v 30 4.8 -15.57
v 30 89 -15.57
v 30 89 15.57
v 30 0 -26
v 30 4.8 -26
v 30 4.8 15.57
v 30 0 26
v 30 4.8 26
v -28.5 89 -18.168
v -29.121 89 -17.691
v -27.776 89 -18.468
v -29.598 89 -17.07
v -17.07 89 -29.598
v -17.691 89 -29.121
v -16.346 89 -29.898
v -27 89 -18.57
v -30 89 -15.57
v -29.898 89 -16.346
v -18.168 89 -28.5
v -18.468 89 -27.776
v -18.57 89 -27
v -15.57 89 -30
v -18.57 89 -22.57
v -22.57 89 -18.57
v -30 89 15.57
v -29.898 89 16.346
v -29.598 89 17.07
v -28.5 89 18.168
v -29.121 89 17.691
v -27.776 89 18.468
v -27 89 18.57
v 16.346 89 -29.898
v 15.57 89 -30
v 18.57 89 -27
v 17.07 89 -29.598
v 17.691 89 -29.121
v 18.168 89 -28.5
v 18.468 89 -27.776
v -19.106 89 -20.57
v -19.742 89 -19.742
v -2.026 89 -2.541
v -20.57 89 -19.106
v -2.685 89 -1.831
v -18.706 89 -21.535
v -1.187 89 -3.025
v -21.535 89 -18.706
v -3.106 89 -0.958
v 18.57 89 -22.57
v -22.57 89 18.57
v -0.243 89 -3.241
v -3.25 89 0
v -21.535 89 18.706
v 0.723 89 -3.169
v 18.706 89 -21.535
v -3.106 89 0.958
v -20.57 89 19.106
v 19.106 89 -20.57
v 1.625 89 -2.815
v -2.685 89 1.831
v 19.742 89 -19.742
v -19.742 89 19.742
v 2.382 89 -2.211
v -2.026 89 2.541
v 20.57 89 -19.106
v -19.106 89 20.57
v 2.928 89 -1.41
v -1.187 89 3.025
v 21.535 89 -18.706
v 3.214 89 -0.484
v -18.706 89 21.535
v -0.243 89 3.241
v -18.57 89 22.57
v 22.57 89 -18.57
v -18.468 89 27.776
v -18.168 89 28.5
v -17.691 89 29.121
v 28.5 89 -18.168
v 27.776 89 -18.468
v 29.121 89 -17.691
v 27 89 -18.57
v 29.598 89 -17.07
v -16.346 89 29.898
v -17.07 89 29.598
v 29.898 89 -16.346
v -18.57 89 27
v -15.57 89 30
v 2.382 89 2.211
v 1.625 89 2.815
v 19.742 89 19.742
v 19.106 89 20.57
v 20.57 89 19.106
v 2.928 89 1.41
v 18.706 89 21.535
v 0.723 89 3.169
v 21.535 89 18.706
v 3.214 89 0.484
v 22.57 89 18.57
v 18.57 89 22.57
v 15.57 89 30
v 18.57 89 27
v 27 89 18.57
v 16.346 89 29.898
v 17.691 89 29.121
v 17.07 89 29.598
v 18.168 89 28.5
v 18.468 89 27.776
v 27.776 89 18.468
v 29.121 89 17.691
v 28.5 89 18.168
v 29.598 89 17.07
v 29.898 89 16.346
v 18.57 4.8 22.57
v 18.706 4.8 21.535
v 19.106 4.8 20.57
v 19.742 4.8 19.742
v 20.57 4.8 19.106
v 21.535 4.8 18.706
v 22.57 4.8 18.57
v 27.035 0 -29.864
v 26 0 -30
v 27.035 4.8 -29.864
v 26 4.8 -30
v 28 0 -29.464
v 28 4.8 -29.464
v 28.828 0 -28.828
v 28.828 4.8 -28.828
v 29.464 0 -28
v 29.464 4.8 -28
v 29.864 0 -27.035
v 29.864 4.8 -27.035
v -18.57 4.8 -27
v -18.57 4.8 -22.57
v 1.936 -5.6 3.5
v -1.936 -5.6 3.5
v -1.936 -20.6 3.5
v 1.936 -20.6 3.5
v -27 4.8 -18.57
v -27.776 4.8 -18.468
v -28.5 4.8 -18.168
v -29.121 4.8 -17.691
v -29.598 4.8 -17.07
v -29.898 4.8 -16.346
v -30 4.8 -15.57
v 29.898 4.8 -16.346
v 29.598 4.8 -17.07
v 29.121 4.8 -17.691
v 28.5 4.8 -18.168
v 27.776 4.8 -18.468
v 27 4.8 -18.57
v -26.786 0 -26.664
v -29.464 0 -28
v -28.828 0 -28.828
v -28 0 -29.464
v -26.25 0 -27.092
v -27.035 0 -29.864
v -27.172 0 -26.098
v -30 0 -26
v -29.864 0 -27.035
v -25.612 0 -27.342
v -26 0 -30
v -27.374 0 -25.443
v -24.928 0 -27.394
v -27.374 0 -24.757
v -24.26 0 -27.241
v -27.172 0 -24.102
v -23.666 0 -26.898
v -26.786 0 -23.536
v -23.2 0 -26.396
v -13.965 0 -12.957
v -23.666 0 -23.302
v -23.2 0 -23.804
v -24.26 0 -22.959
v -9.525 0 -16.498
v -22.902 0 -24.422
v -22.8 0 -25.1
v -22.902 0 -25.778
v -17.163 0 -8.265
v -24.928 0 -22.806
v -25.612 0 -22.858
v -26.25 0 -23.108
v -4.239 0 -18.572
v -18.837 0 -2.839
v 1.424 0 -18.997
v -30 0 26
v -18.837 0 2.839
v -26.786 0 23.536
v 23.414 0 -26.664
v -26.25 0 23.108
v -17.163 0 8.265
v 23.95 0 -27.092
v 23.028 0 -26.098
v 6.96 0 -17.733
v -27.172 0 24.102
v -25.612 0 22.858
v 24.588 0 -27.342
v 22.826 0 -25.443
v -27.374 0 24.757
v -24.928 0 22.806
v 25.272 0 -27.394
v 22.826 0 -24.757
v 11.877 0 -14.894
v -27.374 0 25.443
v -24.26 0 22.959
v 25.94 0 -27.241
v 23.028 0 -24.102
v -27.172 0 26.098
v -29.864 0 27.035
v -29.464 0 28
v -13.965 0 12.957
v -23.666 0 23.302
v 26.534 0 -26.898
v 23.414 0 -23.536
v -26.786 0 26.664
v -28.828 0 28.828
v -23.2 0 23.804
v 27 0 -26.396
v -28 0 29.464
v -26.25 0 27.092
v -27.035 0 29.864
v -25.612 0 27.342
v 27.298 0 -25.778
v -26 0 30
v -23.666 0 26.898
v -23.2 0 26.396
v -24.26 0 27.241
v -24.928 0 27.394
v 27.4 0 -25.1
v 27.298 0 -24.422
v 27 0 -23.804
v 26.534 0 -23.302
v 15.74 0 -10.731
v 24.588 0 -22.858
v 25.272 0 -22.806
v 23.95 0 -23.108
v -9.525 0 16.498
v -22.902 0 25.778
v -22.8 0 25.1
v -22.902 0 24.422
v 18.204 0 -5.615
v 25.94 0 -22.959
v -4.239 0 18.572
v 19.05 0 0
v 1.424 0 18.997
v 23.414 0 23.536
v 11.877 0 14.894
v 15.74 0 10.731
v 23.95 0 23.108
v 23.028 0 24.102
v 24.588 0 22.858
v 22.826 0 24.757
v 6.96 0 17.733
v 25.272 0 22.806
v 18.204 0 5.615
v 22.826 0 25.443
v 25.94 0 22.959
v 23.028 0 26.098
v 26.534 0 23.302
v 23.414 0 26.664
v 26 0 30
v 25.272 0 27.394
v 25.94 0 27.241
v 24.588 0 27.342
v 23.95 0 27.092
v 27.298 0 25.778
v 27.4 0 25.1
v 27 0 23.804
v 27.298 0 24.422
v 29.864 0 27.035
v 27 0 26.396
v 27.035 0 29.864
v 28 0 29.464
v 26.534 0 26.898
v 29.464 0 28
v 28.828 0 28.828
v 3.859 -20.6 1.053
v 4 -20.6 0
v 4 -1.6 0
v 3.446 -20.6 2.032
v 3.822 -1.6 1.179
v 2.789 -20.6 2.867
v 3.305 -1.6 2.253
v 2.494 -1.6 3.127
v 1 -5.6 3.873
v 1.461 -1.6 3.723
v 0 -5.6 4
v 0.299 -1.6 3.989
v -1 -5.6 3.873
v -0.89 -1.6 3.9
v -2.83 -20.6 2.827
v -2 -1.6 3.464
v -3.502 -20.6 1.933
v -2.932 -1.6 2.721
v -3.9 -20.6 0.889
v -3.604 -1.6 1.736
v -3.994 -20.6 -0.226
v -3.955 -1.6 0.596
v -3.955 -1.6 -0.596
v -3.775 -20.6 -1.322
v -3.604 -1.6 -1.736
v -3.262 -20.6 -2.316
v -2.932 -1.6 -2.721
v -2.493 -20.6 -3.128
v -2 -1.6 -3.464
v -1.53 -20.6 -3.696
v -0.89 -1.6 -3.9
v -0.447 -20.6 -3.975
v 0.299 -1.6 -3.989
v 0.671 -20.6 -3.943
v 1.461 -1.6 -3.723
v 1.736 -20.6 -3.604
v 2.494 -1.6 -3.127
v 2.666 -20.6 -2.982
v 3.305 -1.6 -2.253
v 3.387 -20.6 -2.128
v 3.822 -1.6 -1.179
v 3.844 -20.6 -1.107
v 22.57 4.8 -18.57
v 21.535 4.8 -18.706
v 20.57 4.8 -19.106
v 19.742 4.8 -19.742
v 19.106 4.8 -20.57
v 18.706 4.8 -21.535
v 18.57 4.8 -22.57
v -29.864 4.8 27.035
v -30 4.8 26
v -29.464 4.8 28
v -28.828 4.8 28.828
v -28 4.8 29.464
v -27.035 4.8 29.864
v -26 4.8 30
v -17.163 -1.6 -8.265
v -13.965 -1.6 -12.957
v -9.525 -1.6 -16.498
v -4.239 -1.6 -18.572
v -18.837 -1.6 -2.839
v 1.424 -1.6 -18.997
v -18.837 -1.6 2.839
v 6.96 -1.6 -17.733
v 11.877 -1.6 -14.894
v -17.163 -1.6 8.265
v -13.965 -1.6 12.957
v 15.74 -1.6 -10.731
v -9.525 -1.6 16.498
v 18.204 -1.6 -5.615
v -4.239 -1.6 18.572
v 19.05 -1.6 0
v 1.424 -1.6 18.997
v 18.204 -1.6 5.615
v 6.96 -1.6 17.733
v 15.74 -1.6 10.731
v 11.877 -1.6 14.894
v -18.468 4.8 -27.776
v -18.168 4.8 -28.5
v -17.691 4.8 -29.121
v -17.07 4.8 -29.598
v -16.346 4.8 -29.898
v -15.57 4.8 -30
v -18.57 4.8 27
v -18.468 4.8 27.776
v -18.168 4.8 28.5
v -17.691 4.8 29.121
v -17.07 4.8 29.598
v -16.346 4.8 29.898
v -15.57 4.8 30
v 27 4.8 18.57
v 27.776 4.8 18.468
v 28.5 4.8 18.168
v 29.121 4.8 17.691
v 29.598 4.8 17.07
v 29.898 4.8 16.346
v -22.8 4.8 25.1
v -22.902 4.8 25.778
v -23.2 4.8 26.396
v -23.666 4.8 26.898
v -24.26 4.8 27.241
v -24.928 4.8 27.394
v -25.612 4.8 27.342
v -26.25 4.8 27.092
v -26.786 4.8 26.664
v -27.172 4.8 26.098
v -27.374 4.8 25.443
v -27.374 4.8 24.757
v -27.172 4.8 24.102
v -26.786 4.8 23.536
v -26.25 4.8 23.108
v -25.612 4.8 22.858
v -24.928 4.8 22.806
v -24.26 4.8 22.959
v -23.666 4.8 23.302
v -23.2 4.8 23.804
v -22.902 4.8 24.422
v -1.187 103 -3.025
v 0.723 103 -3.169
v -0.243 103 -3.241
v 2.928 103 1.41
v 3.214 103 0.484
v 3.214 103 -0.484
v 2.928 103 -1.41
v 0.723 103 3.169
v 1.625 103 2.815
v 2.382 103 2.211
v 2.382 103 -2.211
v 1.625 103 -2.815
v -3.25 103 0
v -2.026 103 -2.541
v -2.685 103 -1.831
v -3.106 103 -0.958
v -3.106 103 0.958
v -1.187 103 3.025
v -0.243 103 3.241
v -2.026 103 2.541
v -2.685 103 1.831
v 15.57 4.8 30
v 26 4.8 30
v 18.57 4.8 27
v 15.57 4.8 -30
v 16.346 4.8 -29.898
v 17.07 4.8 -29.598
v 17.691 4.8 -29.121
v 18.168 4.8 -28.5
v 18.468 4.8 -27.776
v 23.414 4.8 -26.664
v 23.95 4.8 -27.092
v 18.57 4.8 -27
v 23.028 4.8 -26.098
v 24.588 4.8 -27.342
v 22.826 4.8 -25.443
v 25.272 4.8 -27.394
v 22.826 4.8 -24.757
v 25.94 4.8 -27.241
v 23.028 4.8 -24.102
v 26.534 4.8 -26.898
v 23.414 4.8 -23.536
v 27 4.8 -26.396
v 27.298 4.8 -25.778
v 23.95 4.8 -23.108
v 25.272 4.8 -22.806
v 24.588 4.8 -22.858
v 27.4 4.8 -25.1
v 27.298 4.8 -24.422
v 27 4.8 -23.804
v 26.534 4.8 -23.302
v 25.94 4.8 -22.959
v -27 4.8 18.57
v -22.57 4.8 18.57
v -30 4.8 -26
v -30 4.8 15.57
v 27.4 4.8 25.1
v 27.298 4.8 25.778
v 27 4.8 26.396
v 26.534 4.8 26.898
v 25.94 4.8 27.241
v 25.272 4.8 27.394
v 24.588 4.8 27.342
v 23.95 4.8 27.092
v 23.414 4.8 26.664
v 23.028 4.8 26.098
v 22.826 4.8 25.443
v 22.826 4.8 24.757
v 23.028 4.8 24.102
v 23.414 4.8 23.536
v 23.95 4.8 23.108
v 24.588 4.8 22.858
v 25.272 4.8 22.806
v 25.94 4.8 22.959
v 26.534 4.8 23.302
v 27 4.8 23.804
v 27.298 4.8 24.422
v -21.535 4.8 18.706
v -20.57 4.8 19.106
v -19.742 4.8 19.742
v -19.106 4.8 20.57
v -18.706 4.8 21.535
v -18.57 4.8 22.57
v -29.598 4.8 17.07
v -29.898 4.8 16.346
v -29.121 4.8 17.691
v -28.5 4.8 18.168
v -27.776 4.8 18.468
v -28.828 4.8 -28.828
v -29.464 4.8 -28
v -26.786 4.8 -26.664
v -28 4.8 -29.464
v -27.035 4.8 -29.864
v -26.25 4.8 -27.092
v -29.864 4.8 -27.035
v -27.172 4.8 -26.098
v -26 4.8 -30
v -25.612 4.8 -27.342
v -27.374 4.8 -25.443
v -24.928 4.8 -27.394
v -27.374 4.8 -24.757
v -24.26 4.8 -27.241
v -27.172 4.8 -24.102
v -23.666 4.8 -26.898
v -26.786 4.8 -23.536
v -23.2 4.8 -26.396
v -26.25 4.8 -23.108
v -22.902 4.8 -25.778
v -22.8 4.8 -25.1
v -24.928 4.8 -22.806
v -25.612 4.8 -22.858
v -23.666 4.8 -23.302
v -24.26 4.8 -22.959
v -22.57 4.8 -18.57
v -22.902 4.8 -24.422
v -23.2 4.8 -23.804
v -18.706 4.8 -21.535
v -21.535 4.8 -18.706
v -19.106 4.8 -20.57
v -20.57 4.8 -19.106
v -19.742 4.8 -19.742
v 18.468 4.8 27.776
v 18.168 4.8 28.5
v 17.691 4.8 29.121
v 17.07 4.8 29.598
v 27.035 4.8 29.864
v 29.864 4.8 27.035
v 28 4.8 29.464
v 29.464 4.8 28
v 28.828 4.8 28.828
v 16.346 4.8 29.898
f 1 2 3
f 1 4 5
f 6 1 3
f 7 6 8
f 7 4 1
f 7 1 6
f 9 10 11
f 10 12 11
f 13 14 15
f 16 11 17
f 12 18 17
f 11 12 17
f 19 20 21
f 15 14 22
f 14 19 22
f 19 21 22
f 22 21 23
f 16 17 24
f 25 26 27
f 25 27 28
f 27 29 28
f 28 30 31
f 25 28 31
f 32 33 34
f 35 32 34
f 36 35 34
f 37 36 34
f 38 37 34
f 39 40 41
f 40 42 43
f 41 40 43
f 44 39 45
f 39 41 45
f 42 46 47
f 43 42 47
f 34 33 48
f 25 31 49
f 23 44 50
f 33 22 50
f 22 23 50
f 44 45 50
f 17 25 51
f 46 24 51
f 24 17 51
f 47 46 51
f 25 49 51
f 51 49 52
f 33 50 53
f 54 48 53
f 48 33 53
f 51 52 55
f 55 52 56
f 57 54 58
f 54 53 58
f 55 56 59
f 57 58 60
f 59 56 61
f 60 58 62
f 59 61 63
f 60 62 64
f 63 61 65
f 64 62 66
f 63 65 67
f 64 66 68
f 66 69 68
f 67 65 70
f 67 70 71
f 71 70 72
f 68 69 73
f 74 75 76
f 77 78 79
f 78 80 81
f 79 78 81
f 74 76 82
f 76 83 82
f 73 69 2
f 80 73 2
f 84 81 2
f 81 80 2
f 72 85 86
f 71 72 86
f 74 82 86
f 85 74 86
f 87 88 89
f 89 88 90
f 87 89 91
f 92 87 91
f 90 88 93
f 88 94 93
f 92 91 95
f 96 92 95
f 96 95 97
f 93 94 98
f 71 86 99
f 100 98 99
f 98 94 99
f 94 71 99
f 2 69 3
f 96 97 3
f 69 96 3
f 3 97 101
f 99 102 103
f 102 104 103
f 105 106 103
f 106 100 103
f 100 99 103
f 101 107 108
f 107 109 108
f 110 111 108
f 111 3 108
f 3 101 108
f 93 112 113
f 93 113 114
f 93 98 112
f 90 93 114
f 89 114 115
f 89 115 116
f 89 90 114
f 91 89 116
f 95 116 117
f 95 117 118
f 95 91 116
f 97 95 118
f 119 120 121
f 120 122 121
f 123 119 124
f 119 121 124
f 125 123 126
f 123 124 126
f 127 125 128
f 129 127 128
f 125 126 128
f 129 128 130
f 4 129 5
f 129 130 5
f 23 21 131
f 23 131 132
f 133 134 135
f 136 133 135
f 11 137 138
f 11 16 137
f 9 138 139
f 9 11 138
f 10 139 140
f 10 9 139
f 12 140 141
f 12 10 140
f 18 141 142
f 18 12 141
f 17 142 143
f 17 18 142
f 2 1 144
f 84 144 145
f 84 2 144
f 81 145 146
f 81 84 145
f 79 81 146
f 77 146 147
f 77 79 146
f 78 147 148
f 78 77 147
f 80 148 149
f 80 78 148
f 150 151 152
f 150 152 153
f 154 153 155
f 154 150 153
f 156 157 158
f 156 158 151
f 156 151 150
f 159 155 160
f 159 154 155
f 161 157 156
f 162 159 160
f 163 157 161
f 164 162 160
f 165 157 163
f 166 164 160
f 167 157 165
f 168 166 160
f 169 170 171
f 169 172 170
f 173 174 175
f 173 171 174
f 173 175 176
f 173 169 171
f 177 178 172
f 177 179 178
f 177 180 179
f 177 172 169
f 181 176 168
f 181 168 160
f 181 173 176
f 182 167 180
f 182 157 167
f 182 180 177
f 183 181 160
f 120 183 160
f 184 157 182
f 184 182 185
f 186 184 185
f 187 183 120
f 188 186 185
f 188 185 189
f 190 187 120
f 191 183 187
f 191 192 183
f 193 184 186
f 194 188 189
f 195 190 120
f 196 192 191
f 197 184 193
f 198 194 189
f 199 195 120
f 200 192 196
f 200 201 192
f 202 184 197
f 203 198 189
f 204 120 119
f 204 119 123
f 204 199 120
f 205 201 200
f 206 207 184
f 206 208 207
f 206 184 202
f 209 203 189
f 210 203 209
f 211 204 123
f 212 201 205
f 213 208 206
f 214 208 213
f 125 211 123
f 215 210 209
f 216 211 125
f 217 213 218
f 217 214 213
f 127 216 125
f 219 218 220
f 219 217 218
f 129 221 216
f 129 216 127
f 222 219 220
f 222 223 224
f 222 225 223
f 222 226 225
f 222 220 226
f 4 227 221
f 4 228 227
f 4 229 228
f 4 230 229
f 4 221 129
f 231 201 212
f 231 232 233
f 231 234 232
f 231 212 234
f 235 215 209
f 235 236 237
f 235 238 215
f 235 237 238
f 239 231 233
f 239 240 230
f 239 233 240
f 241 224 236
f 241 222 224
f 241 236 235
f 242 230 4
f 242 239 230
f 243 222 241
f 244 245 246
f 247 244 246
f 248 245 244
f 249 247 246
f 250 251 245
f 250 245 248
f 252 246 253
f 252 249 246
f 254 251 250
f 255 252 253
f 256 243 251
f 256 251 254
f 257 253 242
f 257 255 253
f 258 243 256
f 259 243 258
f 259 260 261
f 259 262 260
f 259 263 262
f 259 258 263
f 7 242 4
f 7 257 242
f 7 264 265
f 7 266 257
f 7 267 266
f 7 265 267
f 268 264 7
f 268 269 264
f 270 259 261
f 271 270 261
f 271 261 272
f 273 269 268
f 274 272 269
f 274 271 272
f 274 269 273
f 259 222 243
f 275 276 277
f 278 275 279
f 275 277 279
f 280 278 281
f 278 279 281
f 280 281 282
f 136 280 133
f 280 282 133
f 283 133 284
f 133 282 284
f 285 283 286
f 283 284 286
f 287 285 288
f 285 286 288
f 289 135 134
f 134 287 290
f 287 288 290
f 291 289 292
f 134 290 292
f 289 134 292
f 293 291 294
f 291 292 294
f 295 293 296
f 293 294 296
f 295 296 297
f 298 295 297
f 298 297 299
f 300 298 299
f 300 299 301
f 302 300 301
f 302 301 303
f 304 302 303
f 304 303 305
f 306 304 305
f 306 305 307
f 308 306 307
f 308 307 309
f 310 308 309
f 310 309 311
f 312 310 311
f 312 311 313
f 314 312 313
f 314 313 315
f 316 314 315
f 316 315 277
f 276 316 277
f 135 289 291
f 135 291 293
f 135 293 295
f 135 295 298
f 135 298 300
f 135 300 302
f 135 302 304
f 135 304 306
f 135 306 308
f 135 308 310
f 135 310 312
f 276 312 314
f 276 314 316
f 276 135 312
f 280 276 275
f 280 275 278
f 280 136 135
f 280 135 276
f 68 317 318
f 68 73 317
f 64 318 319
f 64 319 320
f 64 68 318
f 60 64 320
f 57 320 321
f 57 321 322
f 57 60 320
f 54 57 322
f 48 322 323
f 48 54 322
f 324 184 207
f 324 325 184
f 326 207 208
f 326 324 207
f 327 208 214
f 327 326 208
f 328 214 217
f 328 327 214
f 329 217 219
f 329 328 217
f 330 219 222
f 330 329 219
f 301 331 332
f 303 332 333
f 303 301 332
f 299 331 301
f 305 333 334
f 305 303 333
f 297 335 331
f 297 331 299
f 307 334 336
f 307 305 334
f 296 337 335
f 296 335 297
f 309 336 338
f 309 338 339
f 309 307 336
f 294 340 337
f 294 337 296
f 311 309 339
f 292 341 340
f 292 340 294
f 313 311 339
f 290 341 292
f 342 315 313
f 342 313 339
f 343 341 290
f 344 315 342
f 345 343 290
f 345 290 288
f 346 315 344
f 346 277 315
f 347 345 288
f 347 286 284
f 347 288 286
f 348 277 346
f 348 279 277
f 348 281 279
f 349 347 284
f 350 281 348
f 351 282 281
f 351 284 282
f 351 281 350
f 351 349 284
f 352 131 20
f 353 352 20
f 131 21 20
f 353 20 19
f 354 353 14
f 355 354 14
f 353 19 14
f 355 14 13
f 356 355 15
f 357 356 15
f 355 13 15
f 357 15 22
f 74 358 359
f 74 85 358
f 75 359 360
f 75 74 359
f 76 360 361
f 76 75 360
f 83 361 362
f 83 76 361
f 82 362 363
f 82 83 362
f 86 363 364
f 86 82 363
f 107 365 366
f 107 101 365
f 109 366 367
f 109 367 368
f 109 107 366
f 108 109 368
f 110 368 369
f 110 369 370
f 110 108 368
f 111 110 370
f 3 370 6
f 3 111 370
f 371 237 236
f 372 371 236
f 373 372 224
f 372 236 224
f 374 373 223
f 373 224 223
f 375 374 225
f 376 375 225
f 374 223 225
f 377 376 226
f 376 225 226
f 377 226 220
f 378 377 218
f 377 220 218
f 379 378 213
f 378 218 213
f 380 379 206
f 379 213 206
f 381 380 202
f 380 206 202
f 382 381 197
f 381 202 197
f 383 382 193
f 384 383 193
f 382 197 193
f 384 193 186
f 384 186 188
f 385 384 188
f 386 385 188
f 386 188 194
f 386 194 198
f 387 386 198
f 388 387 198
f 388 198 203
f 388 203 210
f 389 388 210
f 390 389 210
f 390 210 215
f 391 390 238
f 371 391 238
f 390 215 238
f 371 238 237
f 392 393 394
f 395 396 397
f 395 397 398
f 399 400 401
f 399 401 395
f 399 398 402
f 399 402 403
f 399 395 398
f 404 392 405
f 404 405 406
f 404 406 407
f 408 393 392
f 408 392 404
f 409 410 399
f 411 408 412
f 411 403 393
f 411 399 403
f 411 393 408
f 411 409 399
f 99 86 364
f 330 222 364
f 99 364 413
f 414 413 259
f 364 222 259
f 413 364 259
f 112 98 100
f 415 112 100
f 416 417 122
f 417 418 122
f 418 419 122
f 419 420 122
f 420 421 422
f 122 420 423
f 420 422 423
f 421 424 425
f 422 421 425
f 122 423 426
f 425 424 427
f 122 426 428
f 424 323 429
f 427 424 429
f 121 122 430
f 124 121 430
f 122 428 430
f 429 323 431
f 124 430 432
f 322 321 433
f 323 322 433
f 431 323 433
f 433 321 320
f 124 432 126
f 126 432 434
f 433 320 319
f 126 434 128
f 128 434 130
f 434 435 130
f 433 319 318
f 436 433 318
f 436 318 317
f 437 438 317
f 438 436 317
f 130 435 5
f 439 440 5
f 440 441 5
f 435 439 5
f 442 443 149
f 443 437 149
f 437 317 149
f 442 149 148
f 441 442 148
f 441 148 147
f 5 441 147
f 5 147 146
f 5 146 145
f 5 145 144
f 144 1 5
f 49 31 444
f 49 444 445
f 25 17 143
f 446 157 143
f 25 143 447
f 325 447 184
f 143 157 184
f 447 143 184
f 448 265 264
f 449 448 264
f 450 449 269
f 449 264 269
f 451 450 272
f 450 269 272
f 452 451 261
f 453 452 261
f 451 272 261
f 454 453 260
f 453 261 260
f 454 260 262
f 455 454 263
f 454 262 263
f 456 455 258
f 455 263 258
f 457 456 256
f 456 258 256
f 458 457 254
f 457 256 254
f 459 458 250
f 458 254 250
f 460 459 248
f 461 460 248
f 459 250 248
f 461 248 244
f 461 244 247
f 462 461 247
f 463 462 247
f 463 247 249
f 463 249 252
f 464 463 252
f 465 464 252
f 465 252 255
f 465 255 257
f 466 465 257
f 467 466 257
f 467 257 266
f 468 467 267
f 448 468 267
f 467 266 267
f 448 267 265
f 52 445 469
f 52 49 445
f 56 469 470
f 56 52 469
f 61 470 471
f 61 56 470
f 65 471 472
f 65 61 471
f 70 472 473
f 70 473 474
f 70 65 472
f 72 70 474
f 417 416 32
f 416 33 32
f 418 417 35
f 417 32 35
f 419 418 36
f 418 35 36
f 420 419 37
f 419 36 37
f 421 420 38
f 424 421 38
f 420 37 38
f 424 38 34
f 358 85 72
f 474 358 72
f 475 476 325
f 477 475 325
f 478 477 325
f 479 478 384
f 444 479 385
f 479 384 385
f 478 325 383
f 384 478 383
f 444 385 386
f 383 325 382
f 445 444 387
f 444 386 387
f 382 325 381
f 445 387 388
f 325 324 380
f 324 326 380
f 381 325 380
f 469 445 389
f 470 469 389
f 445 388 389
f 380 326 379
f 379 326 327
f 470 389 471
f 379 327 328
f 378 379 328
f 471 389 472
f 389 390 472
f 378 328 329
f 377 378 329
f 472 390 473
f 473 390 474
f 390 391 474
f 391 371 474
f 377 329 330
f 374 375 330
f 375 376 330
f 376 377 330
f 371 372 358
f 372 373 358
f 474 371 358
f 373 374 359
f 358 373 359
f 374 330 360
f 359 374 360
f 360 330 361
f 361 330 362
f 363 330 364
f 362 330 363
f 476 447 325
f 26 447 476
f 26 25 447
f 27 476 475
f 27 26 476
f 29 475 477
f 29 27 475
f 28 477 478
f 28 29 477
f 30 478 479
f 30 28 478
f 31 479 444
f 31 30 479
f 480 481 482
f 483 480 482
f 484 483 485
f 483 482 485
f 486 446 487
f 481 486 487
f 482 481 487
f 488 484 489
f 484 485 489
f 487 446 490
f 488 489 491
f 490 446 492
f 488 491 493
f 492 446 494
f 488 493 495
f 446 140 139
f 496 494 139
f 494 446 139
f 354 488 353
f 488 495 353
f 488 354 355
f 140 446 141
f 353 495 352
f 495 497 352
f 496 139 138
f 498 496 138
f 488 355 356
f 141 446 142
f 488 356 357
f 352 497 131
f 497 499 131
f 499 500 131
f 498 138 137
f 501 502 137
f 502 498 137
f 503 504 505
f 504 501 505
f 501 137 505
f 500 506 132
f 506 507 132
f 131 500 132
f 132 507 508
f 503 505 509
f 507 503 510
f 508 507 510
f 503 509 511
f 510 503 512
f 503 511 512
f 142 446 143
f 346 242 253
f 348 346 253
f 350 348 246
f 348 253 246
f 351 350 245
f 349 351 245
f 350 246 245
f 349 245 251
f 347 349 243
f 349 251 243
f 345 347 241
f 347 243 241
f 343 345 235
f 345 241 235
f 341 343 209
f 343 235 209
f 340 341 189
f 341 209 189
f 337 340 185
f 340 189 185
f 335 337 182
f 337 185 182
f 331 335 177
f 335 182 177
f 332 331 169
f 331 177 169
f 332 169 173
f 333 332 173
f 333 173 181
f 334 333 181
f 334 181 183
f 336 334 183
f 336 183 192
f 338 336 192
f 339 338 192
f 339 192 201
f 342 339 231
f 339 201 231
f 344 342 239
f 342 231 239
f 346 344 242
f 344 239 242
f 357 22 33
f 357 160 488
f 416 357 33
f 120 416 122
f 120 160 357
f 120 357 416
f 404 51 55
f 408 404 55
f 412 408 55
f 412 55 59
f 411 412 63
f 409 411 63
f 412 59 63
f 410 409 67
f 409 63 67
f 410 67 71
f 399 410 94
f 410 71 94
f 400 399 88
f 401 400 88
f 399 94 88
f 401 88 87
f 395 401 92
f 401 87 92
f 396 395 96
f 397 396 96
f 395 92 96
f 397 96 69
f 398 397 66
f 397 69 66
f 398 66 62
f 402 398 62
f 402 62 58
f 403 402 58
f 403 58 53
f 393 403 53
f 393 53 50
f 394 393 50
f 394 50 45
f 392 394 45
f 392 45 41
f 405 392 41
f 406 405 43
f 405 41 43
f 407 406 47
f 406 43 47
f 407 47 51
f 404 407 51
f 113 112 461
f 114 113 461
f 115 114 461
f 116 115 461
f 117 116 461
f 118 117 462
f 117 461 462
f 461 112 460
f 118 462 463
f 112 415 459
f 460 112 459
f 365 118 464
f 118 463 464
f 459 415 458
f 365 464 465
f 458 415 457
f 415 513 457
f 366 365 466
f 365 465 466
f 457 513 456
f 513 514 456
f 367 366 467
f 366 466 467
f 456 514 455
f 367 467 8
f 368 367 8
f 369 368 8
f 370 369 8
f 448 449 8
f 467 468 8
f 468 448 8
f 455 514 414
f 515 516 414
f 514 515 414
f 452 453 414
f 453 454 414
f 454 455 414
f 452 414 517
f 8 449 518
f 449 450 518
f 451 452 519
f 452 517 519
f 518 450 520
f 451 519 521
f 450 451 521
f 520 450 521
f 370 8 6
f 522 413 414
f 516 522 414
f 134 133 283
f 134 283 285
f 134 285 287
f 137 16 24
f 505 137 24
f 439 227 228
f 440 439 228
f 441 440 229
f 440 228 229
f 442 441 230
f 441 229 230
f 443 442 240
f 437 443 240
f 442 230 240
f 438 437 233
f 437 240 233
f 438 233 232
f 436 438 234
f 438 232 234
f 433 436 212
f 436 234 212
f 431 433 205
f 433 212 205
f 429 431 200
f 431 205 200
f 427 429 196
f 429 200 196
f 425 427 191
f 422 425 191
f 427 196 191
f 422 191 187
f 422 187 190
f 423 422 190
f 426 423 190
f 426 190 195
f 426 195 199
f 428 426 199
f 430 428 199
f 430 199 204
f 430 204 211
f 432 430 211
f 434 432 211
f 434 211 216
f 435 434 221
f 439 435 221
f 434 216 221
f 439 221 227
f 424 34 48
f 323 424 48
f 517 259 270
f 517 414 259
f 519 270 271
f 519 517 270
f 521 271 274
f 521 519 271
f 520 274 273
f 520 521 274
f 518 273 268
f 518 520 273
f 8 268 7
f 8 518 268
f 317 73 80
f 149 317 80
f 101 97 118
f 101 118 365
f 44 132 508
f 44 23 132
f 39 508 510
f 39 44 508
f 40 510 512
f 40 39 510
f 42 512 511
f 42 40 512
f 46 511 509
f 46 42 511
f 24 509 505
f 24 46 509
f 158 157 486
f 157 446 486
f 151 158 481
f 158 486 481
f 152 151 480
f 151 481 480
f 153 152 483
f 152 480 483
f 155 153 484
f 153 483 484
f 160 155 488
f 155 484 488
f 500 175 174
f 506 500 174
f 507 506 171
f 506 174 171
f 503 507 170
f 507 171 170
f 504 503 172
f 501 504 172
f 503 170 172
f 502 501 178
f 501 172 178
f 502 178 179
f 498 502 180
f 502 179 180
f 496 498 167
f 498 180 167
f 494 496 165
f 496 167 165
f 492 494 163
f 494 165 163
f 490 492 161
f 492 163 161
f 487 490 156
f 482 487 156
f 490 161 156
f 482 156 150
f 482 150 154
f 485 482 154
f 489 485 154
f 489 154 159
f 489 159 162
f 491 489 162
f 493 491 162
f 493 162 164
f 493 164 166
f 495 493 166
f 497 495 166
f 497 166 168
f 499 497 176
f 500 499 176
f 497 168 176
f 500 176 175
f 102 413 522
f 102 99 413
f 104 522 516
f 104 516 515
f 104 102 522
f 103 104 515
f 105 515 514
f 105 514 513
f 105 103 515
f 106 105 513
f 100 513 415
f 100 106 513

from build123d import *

# Parameters (mm, degrees)
F0_W      = 60
F0_H      = 60
F0_R      = 2.3
F0_R_2    = 19.05
F0_R_3    = 4
F1_DEPTH  = 4.8
F2_DEPTH  = 1.6
F3_DEPTH  = 20.6
F4_R      = 4
F5_W      = 15
F5_H      = 0.5
F6_DEPTH  = 60.001
F7_W      = 37.14
F7_H      = 11.43
F7_H_2    = 37.14
F7_W_2    = 11.43
F8_DEPTH  = 89
F9_R      = 4
F10_R     = 3
F11_R     = 3.25
F12_DEPTH = 14


with BuildPart() as f1:
    # F0 (on Front) → F1 (new body)
    with BuildSketch(Plane.XZ):
        Rectangle(F0_W, F0_H)
        with Locations((-25.1, -25.1)):
            Circle(F0_R, mode=Mode.SUBTRACT)
        with Locations((25.1, -25.1)):
            Circle(F0_R, mode=Mode.SUBTRACT)
        with Locations((-25.1, 25.1)):
            Circle(F0_R, mode=Mode.SUBTRACT)
        Circle(F0_R_2, mode=Mode.SUBTRACT)
        with Locations((25.1, 25.1)):
            Circle(F0_R, mode=Mode.SUBTRACT)
        Circle(F0_R_2)
        Circle(F0_R_3, mode=Mode.SUBTRACT)
        Circle(F0_R_3)
    extrude(amount=-F1_DEPTH)

    # F0 (on Front) → F2 (join)
    with BuildSketch(Plane.XZ):
        Circle(F0_R_2)
        Circle(F0_R_3, mode=Mode.SUBTRACT)
    extrude(amount=F2_DEPTH)

    # F0 (on Front) → F3 (join)
    with BuildSketch(Plane.XZ):
        Circle(F0_R_3)
    extrude(amount=F3_DEPTH)

    # F4
    f4_edges = [f1.edges().sort_by_distance(p)[0] for p in [
        (-30, 2.4, 30),
        (30, 2.4, 30),
        (30, 2.4, -30),
        (-30, 2.4, -30),
    ]]
    fillet(f4_edges, radius=F4_R)

    # F5 (on face) → F6 (cut, through all)
    with BuildSketch(Plane(origin=(-30, 0, 0), x_dir=(0, -1, 0), z_dir=(-1, 0, 0))):
        with Locations((13.1, 3.75)):
            Rectangle(F5_W, F5_H)
    extrude(amount=-F6_DEPTH, mode=Mode.SUBTRACT)

    # F7 (on Front) → F8 (join)
    with BuildSketch(Plane.XZ):
        with Locations((0, 24.285)):
            Rectangle(F7_W, F7_H)
        Rectangle(F7_W, F7_H_2)
        with Locations((-24.285, 0)):
            Rectangle(F7_W_2, F7_H_2)
        with Locations((24.285, 0)):
            Rectangle(F7_W_2, F7_H_2)
        with Locations((0, -24.285)):
            Rectangle(F7_W, F7_H)
    extrude(amount=-F8_DEPTH)

    # F9
    f9_edges = [f1.edges().sort_by_distance(p)[0] for p in [
        (18.57, 46.9, 18.57),
        (-18.57, 46.9, 18.57),
        (-18.57, 46.9, -18.57),
        (18.57, 46.9, -18.57),
    ]]
    fillet(f9_edges, radius=F9_R)

    # F10
    f10_edges = [f1.edges().sort_by_distance(p)[0] for p in [
        (18.57, 46.9, 30),
        (30, 46.9, 18.57),
        (30, 46.9, -18.57),
        (18.57, 46.9, -30),
        (-18.57, 46.9, -30),
        (-30, 46.9, -18.57),
        (-30, 46.9, 18.57),
        (-18.57, 46.9, 30),
    ]]
    fillet(f10_edges, radius=F10_R)

    # F11 (on face) → F12 (join)
    with BuildSketch(Plane(origin=(0, 89, 0), x_dir=(-1, 0, 0), z_dir=(0, 1, 0))):
        Circle(F11_R)
    extrude(amount=F12_DEPTH)


solid = f1.part
